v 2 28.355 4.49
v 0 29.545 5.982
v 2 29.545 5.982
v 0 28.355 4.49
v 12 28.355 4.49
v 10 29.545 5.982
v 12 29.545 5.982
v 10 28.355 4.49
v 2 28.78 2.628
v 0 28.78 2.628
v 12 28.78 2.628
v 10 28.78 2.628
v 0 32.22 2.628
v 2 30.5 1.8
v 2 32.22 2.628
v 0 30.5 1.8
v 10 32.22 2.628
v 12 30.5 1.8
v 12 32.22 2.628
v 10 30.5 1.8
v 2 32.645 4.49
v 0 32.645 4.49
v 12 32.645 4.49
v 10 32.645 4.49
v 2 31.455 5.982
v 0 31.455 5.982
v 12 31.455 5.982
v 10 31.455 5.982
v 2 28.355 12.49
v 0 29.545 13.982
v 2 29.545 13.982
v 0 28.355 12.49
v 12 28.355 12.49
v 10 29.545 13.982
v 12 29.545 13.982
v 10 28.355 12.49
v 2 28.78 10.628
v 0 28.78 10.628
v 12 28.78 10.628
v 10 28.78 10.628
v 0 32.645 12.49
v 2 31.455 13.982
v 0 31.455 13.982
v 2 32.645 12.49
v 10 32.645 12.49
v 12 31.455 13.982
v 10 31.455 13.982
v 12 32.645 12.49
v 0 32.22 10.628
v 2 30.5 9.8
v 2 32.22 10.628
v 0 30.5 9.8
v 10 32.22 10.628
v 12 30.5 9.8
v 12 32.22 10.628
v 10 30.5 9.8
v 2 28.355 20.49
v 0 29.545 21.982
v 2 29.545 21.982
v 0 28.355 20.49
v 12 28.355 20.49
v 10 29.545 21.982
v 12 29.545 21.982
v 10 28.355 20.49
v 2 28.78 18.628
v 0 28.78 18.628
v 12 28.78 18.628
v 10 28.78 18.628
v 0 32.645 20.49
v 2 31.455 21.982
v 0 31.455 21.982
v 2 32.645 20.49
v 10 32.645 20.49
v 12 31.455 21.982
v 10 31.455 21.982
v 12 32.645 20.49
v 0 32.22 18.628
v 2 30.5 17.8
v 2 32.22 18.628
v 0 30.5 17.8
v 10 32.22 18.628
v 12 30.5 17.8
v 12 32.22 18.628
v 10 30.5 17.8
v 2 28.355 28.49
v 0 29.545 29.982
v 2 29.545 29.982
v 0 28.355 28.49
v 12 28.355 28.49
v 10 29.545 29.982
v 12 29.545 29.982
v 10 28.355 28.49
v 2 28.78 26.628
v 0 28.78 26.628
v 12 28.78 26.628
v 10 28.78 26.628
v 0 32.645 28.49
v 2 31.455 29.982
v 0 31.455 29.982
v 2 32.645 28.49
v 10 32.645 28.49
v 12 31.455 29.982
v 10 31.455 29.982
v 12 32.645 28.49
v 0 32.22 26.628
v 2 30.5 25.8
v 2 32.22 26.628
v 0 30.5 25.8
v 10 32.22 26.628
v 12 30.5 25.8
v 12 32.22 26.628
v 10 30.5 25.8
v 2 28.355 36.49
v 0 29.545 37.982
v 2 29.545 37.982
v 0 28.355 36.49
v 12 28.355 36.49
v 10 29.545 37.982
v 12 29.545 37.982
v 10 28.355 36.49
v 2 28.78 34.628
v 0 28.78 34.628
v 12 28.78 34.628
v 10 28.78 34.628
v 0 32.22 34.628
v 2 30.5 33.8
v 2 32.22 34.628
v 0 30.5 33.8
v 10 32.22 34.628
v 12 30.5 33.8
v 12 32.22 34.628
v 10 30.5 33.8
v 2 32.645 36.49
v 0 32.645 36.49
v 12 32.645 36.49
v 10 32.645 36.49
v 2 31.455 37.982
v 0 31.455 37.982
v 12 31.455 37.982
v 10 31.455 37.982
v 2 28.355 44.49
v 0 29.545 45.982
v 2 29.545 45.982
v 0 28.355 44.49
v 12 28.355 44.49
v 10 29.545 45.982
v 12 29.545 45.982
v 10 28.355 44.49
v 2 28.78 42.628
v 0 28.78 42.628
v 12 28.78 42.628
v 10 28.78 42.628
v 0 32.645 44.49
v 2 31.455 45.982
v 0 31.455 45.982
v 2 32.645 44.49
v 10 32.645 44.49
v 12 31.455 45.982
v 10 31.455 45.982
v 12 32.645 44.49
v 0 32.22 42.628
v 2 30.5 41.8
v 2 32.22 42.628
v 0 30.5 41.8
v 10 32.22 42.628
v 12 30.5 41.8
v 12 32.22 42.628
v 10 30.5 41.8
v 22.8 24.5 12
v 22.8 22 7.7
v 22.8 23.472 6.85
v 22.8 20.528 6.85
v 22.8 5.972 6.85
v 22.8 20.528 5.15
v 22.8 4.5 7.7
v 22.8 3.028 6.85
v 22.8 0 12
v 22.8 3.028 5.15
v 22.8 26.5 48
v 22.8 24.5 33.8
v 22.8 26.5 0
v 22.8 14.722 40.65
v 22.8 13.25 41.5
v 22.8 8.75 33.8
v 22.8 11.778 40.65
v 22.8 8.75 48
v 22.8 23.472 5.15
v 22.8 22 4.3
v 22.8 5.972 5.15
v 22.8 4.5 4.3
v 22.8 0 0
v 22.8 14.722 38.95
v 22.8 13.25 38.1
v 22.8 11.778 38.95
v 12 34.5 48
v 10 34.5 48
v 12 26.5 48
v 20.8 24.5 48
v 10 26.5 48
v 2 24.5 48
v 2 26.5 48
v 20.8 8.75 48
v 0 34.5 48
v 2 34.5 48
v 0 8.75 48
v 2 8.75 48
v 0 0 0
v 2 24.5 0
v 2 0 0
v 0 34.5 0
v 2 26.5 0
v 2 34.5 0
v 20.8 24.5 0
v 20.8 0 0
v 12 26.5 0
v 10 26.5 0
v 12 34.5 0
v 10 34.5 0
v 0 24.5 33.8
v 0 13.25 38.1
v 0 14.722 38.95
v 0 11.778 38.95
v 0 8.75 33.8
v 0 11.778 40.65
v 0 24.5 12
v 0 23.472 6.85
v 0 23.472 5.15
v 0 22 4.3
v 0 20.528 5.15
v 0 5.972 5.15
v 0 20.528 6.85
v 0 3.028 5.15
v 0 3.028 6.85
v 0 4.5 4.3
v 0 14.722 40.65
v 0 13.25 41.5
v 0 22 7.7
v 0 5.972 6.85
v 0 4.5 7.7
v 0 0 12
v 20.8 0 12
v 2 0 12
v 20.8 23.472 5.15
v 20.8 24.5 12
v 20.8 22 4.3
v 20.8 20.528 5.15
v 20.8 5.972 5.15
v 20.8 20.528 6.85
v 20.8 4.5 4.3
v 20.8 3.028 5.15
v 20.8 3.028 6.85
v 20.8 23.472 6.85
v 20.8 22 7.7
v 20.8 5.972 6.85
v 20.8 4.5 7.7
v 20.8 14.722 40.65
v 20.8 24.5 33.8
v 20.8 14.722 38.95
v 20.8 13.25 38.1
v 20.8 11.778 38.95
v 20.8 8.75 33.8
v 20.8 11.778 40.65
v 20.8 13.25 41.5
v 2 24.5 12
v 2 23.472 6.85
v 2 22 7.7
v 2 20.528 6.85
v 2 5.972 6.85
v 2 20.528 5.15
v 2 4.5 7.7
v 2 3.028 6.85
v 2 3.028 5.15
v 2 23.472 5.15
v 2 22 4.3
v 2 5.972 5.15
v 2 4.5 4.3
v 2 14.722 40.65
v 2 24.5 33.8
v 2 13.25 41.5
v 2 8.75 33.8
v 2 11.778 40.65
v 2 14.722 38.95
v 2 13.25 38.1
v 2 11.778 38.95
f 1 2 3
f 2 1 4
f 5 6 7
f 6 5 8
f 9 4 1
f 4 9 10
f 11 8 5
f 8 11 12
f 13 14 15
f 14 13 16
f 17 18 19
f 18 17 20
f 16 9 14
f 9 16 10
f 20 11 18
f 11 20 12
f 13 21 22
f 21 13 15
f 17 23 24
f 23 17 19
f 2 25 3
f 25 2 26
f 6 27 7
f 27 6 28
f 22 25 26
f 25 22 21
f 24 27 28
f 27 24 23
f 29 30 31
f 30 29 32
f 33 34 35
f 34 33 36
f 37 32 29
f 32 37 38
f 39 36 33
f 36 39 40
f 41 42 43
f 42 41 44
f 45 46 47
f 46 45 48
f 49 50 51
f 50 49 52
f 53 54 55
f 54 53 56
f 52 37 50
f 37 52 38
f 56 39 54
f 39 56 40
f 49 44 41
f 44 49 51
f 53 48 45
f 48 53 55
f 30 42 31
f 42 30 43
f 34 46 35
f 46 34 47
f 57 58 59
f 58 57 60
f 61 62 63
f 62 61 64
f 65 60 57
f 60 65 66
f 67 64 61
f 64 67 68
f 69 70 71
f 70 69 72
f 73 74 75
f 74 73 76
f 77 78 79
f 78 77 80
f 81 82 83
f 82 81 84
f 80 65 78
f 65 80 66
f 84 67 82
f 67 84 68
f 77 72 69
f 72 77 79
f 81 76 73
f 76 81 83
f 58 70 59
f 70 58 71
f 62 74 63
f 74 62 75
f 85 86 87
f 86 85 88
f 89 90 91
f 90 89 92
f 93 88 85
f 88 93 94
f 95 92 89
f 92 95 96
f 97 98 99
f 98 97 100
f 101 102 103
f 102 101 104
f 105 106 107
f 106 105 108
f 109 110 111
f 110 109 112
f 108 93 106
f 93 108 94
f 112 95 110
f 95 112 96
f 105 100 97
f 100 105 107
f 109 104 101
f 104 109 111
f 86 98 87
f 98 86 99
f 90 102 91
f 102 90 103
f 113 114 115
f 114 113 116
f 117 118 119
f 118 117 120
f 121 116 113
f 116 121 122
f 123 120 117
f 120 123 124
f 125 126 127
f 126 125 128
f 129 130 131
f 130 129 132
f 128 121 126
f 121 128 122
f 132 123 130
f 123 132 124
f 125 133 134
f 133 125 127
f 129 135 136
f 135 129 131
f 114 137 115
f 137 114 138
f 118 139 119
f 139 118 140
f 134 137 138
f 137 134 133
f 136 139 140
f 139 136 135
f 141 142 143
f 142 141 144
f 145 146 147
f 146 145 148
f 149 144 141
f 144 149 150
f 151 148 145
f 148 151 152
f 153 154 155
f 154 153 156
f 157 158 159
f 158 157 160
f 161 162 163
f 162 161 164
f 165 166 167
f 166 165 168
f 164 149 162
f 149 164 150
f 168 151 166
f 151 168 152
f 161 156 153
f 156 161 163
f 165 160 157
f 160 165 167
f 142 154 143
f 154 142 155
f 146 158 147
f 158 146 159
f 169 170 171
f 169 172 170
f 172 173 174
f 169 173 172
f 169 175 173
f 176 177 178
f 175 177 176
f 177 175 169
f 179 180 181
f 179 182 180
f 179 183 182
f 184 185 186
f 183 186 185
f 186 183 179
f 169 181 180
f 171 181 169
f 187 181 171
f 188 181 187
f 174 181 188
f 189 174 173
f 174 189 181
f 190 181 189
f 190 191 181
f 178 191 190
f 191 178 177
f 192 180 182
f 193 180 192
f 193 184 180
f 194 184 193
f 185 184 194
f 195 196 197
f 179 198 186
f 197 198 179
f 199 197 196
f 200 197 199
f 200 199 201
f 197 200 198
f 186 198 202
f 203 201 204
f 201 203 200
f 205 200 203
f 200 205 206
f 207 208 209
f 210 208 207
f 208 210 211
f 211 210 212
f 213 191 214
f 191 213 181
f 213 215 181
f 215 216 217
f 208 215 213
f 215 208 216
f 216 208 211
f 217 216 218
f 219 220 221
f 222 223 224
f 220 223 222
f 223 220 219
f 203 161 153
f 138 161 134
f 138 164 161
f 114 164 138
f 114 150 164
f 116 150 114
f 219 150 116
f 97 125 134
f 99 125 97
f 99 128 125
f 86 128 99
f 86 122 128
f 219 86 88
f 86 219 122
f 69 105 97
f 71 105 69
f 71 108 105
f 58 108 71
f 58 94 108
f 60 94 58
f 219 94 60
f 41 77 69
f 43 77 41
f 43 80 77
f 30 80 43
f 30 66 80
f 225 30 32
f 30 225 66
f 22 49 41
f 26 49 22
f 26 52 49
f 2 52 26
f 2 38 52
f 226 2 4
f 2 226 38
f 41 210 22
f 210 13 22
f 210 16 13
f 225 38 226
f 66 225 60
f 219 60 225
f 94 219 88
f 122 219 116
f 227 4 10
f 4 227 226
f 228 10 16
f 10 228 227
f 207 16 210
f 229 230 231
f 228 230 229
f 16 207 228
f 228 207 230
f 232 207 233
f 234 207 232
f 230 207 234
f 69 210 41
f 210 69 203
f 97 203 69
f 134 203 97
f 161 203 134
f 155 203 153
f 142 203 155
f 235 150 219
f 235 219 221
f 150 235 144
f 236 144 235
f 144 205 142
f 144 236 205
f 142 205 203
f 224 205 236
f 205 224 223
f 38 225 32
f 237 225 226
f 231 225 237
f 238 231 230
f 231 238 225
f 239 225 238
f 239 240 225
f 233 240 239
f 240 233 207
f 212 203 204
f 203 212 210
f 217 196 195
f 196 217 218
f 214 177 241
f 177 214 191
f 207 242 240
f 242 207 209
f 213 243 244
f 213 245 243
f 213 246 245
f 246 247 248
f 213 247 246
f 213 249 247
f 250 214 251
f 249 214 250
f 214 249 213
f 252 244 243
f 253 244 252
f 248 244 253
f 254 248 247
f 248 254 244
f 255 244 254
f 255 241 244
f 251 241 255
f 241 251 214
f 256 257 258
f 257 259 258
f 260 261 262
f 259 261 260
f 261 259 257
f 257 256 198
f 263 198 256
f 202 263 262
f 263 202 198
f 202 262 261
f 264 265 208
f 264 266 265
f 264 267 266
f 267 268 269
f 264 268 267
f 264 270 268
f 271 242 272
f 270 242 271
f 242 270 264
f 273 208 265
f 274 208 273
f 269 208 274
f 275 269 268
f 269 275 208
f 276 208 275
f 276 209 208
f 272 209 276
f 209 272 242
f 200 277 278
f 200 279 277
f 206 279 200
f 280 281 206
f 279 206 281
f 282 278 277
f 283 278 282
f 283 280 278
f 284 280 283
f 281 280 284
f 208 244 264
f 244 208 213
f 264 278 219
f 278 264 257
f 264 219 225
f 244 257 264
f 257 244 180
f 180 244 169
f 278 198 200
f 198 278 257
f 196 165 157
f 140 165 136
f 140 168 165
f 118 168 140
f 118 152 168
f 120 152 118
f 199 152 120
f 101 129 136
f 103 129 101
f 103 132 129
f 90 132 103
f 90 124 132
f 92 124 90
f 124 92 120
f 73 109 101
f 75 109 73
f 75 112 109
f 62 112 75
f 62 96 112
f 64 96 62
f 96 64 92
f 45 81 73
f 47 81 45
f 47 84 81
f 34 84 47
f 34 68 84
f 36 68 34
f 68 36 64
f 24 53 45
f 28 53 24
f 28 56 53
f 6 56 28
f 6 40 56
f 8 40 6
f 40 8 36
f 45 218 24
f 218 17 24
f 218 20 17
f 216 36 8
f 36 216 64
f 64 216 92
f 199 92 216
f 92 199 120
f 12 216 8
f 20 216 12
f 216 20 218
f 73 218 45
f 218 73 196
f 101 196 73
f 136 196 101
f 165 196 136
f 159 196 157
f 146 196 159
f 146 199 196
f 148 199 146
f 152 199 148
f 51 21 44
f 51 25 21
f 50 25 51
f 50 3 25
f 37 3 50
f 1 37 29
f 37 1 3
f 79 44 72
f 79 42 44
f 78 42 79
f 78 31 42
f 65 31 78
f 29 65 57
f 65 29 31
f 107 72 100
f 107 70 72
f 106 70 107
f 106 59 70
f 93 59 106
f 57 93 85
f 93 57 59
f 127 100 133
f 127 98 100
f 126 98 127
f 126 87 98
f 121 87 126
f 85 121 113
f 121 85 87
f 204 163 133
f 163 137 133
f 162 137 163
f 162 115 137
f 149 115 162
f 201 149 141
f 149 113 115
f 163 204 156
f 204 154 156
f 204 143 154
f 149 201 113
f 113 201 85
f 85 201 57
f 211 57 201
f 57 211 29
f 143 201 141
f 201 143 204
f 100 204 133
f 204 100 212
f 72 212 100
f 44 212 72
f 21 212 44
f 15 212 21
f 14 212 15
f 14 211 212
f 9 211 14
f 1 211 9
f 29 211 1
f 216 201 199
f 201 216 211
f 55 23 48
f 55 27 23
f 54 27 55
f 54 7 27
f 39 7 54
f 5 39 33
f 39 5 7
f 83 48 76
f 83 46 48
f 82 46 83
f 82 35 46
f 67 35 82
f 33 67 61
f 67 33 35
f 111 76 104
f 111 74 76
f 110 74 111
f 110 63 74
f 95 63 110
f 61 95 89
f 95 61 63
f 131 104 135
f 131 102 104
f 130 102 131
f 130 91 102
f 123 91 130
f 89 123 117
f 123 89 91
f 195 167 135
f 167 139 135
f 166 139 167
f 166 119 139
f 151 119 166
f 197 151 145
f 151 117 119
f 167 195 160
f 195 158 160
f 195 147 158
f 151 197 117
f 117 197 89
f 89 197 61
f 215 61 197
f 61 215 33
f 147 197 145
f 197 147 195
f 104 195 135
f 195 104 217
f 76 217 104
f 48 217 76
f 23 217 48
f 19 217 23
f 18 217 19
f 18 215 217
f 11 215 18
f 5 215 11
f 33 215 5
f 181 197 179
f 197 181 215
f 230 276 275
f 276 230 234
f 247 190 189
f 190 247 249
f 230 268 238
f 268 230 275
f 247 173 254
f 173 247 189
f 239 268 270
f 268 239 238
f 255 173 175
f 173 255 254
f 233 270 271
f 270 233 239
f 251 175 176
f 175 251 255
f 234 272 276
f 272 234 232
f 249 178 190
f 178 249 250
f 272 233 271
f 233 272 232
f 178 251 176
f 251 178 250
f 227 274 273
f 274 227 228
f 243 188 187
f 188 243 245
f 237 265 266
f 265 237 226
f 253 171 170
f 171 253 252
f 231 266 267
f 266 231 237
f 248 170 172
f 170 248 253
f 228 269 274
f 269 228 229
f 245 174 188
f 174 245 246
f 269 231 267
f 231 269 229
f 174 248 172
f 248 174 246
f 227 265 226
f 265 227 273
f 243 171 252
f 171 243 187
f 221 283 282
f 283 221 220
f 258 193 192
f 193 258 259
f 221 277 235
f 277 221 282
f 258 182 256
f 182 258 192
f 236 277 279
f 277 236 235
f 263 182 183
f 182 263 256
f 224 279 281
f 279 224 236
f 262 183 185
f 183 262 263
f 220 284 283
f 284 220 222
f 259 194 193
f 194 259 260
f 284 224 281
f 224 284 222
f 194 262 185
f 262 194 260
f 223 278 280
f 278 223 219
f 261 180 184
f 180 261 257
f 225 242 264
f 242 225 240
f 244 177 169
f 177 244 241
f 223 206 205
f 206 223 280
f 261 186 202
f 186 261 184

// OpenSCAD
// configuration
space = 4;
hole = 4;
pad = space/2;
left = true;

// motor size
motor_length = 18.8;
motor_width = 22.5;

// distances between holes
// 2 front holes - 1 back hole
front_hole_dist = 17.5;
front_back_dist = 31.8 + 2;  // 1 = distance motor block - back hole
back_axis_dist = 11.2;

// hole diameters
tie_hole = 3;
axis_hole = 7.2;
picot_hole = 5;


// sizes after to adaption to hole scheme
vert_offset = 6;     // from border to tie hole center
piece_height = 2*vert_offset + front_back_dist;
hh = ceil((piece_height - 2*pad + space) / (space+hole));
h = hh*hole + (hh-1)*space + 2*pad;
l = motor_length + 2*pad;
w = motor_width + pad + pad + hole + pad + pad;
tie_offset = (motor_width - front_hole_dist)/2 + pad;
mw = motor_width + pad;


difference() {
    cube([l, w, h]);
    
    // motor hollow
    translate([pad, -pad, -pad]) {
        cube([motor_length, mw + pad, h + 2*pad]);
    };

    // bar hollow
    bar_offx = left ? pad : (l - 3*pad - hole);
    translate([bar_offx, w - hole - 2*pad, -pad]) {
        cube([hole+2*pad, hole+3*pad, h + 2*pad]);
    };

    // outside bar hollow
    hollow_offx = left ? hole + 4*pad : -pad;
    translate([
        hollow_offx,
        w - hole - 2*pad,
        -pad
    ]) {
        cube([
            l - hole - 3*pad,
            hole+3*pad,
            h + 2*pad]
        );
    };

    // bar holes
    for(i=[1:hh]) {
        translate([
            (l + 2*pad)/2 - pad,
            w - pad - hole/2,
            i*hole + (i-1)*space - hole/2 + pad
        ]) {
            rotate([0, 90, 0]) {
                translate([0, 0, -(l + 2*pad)/2]) {
                    cylinder(h=w + 2*pad, r=hole/2 + 0.2);
                };
            };
        };
    };

    // tie hole (bottom)
    translate([
        (l + 2*pad)/2 - pad,
        tie_offset,
        vert_offset
    ]) {
        rotate([0, 90, 0]) {
            translate([
                0,
                0,
                -(l + 2*pad)/2
            ]) {
                cylinder(
                    h=l + 2*pad,
                    r=tie_hole/2 + 0.2
                );
            };
        };
    };

    // tie hole (top)
    translate([
        (l + 2*pad)/2 - pad,
        tie_offset + front_hole_dist,
        vert_offset
    ]) {
        rotate([0, 90, 0]) {
            translate([
                0,
                0,
                -(l + 2*pad)/2
            ]) {
                cylinder(
                    h = l + 2*pad,
                    r = tie_hole/2 + 0.2
                );
            };
        };
    };



    // back hole
    translate([
        (l + 2*pad)/2 - pad,
        tie_offset + front_hole_dist/2,
        vert_offset + front_back_dist])
    {
        rotate([0, 90, 0]) {
            translate([
                0,
                0,
                -(l + 2*pad)/2
            ]) {
                cylinder(
                    h = l + 2*pad,
                    r = tie_hole/2 + 0.2
                );
            };
        };
    };

    // main hollow
    translate([
        -pad, 
        -pad,
        2*vert_offset
    ]) {
        cube([
            l + 2*pad,
            mw + pad,
            front_back_dist - 2*vert_offset
        ]);
    }
    
    // back main hollow
    translate([
        -pad,
        -2*pad,
        vert_offset + front_back_dist - vert_offset - pad
    ]) {
        cube([
            l + 2*pad,
            tie_offset + front_hole_dist/2 + 2*pad - tie_offset,
            h - vert_offset - front_back_dist + vert_offset + 2*pad
        ]);
    }

};
